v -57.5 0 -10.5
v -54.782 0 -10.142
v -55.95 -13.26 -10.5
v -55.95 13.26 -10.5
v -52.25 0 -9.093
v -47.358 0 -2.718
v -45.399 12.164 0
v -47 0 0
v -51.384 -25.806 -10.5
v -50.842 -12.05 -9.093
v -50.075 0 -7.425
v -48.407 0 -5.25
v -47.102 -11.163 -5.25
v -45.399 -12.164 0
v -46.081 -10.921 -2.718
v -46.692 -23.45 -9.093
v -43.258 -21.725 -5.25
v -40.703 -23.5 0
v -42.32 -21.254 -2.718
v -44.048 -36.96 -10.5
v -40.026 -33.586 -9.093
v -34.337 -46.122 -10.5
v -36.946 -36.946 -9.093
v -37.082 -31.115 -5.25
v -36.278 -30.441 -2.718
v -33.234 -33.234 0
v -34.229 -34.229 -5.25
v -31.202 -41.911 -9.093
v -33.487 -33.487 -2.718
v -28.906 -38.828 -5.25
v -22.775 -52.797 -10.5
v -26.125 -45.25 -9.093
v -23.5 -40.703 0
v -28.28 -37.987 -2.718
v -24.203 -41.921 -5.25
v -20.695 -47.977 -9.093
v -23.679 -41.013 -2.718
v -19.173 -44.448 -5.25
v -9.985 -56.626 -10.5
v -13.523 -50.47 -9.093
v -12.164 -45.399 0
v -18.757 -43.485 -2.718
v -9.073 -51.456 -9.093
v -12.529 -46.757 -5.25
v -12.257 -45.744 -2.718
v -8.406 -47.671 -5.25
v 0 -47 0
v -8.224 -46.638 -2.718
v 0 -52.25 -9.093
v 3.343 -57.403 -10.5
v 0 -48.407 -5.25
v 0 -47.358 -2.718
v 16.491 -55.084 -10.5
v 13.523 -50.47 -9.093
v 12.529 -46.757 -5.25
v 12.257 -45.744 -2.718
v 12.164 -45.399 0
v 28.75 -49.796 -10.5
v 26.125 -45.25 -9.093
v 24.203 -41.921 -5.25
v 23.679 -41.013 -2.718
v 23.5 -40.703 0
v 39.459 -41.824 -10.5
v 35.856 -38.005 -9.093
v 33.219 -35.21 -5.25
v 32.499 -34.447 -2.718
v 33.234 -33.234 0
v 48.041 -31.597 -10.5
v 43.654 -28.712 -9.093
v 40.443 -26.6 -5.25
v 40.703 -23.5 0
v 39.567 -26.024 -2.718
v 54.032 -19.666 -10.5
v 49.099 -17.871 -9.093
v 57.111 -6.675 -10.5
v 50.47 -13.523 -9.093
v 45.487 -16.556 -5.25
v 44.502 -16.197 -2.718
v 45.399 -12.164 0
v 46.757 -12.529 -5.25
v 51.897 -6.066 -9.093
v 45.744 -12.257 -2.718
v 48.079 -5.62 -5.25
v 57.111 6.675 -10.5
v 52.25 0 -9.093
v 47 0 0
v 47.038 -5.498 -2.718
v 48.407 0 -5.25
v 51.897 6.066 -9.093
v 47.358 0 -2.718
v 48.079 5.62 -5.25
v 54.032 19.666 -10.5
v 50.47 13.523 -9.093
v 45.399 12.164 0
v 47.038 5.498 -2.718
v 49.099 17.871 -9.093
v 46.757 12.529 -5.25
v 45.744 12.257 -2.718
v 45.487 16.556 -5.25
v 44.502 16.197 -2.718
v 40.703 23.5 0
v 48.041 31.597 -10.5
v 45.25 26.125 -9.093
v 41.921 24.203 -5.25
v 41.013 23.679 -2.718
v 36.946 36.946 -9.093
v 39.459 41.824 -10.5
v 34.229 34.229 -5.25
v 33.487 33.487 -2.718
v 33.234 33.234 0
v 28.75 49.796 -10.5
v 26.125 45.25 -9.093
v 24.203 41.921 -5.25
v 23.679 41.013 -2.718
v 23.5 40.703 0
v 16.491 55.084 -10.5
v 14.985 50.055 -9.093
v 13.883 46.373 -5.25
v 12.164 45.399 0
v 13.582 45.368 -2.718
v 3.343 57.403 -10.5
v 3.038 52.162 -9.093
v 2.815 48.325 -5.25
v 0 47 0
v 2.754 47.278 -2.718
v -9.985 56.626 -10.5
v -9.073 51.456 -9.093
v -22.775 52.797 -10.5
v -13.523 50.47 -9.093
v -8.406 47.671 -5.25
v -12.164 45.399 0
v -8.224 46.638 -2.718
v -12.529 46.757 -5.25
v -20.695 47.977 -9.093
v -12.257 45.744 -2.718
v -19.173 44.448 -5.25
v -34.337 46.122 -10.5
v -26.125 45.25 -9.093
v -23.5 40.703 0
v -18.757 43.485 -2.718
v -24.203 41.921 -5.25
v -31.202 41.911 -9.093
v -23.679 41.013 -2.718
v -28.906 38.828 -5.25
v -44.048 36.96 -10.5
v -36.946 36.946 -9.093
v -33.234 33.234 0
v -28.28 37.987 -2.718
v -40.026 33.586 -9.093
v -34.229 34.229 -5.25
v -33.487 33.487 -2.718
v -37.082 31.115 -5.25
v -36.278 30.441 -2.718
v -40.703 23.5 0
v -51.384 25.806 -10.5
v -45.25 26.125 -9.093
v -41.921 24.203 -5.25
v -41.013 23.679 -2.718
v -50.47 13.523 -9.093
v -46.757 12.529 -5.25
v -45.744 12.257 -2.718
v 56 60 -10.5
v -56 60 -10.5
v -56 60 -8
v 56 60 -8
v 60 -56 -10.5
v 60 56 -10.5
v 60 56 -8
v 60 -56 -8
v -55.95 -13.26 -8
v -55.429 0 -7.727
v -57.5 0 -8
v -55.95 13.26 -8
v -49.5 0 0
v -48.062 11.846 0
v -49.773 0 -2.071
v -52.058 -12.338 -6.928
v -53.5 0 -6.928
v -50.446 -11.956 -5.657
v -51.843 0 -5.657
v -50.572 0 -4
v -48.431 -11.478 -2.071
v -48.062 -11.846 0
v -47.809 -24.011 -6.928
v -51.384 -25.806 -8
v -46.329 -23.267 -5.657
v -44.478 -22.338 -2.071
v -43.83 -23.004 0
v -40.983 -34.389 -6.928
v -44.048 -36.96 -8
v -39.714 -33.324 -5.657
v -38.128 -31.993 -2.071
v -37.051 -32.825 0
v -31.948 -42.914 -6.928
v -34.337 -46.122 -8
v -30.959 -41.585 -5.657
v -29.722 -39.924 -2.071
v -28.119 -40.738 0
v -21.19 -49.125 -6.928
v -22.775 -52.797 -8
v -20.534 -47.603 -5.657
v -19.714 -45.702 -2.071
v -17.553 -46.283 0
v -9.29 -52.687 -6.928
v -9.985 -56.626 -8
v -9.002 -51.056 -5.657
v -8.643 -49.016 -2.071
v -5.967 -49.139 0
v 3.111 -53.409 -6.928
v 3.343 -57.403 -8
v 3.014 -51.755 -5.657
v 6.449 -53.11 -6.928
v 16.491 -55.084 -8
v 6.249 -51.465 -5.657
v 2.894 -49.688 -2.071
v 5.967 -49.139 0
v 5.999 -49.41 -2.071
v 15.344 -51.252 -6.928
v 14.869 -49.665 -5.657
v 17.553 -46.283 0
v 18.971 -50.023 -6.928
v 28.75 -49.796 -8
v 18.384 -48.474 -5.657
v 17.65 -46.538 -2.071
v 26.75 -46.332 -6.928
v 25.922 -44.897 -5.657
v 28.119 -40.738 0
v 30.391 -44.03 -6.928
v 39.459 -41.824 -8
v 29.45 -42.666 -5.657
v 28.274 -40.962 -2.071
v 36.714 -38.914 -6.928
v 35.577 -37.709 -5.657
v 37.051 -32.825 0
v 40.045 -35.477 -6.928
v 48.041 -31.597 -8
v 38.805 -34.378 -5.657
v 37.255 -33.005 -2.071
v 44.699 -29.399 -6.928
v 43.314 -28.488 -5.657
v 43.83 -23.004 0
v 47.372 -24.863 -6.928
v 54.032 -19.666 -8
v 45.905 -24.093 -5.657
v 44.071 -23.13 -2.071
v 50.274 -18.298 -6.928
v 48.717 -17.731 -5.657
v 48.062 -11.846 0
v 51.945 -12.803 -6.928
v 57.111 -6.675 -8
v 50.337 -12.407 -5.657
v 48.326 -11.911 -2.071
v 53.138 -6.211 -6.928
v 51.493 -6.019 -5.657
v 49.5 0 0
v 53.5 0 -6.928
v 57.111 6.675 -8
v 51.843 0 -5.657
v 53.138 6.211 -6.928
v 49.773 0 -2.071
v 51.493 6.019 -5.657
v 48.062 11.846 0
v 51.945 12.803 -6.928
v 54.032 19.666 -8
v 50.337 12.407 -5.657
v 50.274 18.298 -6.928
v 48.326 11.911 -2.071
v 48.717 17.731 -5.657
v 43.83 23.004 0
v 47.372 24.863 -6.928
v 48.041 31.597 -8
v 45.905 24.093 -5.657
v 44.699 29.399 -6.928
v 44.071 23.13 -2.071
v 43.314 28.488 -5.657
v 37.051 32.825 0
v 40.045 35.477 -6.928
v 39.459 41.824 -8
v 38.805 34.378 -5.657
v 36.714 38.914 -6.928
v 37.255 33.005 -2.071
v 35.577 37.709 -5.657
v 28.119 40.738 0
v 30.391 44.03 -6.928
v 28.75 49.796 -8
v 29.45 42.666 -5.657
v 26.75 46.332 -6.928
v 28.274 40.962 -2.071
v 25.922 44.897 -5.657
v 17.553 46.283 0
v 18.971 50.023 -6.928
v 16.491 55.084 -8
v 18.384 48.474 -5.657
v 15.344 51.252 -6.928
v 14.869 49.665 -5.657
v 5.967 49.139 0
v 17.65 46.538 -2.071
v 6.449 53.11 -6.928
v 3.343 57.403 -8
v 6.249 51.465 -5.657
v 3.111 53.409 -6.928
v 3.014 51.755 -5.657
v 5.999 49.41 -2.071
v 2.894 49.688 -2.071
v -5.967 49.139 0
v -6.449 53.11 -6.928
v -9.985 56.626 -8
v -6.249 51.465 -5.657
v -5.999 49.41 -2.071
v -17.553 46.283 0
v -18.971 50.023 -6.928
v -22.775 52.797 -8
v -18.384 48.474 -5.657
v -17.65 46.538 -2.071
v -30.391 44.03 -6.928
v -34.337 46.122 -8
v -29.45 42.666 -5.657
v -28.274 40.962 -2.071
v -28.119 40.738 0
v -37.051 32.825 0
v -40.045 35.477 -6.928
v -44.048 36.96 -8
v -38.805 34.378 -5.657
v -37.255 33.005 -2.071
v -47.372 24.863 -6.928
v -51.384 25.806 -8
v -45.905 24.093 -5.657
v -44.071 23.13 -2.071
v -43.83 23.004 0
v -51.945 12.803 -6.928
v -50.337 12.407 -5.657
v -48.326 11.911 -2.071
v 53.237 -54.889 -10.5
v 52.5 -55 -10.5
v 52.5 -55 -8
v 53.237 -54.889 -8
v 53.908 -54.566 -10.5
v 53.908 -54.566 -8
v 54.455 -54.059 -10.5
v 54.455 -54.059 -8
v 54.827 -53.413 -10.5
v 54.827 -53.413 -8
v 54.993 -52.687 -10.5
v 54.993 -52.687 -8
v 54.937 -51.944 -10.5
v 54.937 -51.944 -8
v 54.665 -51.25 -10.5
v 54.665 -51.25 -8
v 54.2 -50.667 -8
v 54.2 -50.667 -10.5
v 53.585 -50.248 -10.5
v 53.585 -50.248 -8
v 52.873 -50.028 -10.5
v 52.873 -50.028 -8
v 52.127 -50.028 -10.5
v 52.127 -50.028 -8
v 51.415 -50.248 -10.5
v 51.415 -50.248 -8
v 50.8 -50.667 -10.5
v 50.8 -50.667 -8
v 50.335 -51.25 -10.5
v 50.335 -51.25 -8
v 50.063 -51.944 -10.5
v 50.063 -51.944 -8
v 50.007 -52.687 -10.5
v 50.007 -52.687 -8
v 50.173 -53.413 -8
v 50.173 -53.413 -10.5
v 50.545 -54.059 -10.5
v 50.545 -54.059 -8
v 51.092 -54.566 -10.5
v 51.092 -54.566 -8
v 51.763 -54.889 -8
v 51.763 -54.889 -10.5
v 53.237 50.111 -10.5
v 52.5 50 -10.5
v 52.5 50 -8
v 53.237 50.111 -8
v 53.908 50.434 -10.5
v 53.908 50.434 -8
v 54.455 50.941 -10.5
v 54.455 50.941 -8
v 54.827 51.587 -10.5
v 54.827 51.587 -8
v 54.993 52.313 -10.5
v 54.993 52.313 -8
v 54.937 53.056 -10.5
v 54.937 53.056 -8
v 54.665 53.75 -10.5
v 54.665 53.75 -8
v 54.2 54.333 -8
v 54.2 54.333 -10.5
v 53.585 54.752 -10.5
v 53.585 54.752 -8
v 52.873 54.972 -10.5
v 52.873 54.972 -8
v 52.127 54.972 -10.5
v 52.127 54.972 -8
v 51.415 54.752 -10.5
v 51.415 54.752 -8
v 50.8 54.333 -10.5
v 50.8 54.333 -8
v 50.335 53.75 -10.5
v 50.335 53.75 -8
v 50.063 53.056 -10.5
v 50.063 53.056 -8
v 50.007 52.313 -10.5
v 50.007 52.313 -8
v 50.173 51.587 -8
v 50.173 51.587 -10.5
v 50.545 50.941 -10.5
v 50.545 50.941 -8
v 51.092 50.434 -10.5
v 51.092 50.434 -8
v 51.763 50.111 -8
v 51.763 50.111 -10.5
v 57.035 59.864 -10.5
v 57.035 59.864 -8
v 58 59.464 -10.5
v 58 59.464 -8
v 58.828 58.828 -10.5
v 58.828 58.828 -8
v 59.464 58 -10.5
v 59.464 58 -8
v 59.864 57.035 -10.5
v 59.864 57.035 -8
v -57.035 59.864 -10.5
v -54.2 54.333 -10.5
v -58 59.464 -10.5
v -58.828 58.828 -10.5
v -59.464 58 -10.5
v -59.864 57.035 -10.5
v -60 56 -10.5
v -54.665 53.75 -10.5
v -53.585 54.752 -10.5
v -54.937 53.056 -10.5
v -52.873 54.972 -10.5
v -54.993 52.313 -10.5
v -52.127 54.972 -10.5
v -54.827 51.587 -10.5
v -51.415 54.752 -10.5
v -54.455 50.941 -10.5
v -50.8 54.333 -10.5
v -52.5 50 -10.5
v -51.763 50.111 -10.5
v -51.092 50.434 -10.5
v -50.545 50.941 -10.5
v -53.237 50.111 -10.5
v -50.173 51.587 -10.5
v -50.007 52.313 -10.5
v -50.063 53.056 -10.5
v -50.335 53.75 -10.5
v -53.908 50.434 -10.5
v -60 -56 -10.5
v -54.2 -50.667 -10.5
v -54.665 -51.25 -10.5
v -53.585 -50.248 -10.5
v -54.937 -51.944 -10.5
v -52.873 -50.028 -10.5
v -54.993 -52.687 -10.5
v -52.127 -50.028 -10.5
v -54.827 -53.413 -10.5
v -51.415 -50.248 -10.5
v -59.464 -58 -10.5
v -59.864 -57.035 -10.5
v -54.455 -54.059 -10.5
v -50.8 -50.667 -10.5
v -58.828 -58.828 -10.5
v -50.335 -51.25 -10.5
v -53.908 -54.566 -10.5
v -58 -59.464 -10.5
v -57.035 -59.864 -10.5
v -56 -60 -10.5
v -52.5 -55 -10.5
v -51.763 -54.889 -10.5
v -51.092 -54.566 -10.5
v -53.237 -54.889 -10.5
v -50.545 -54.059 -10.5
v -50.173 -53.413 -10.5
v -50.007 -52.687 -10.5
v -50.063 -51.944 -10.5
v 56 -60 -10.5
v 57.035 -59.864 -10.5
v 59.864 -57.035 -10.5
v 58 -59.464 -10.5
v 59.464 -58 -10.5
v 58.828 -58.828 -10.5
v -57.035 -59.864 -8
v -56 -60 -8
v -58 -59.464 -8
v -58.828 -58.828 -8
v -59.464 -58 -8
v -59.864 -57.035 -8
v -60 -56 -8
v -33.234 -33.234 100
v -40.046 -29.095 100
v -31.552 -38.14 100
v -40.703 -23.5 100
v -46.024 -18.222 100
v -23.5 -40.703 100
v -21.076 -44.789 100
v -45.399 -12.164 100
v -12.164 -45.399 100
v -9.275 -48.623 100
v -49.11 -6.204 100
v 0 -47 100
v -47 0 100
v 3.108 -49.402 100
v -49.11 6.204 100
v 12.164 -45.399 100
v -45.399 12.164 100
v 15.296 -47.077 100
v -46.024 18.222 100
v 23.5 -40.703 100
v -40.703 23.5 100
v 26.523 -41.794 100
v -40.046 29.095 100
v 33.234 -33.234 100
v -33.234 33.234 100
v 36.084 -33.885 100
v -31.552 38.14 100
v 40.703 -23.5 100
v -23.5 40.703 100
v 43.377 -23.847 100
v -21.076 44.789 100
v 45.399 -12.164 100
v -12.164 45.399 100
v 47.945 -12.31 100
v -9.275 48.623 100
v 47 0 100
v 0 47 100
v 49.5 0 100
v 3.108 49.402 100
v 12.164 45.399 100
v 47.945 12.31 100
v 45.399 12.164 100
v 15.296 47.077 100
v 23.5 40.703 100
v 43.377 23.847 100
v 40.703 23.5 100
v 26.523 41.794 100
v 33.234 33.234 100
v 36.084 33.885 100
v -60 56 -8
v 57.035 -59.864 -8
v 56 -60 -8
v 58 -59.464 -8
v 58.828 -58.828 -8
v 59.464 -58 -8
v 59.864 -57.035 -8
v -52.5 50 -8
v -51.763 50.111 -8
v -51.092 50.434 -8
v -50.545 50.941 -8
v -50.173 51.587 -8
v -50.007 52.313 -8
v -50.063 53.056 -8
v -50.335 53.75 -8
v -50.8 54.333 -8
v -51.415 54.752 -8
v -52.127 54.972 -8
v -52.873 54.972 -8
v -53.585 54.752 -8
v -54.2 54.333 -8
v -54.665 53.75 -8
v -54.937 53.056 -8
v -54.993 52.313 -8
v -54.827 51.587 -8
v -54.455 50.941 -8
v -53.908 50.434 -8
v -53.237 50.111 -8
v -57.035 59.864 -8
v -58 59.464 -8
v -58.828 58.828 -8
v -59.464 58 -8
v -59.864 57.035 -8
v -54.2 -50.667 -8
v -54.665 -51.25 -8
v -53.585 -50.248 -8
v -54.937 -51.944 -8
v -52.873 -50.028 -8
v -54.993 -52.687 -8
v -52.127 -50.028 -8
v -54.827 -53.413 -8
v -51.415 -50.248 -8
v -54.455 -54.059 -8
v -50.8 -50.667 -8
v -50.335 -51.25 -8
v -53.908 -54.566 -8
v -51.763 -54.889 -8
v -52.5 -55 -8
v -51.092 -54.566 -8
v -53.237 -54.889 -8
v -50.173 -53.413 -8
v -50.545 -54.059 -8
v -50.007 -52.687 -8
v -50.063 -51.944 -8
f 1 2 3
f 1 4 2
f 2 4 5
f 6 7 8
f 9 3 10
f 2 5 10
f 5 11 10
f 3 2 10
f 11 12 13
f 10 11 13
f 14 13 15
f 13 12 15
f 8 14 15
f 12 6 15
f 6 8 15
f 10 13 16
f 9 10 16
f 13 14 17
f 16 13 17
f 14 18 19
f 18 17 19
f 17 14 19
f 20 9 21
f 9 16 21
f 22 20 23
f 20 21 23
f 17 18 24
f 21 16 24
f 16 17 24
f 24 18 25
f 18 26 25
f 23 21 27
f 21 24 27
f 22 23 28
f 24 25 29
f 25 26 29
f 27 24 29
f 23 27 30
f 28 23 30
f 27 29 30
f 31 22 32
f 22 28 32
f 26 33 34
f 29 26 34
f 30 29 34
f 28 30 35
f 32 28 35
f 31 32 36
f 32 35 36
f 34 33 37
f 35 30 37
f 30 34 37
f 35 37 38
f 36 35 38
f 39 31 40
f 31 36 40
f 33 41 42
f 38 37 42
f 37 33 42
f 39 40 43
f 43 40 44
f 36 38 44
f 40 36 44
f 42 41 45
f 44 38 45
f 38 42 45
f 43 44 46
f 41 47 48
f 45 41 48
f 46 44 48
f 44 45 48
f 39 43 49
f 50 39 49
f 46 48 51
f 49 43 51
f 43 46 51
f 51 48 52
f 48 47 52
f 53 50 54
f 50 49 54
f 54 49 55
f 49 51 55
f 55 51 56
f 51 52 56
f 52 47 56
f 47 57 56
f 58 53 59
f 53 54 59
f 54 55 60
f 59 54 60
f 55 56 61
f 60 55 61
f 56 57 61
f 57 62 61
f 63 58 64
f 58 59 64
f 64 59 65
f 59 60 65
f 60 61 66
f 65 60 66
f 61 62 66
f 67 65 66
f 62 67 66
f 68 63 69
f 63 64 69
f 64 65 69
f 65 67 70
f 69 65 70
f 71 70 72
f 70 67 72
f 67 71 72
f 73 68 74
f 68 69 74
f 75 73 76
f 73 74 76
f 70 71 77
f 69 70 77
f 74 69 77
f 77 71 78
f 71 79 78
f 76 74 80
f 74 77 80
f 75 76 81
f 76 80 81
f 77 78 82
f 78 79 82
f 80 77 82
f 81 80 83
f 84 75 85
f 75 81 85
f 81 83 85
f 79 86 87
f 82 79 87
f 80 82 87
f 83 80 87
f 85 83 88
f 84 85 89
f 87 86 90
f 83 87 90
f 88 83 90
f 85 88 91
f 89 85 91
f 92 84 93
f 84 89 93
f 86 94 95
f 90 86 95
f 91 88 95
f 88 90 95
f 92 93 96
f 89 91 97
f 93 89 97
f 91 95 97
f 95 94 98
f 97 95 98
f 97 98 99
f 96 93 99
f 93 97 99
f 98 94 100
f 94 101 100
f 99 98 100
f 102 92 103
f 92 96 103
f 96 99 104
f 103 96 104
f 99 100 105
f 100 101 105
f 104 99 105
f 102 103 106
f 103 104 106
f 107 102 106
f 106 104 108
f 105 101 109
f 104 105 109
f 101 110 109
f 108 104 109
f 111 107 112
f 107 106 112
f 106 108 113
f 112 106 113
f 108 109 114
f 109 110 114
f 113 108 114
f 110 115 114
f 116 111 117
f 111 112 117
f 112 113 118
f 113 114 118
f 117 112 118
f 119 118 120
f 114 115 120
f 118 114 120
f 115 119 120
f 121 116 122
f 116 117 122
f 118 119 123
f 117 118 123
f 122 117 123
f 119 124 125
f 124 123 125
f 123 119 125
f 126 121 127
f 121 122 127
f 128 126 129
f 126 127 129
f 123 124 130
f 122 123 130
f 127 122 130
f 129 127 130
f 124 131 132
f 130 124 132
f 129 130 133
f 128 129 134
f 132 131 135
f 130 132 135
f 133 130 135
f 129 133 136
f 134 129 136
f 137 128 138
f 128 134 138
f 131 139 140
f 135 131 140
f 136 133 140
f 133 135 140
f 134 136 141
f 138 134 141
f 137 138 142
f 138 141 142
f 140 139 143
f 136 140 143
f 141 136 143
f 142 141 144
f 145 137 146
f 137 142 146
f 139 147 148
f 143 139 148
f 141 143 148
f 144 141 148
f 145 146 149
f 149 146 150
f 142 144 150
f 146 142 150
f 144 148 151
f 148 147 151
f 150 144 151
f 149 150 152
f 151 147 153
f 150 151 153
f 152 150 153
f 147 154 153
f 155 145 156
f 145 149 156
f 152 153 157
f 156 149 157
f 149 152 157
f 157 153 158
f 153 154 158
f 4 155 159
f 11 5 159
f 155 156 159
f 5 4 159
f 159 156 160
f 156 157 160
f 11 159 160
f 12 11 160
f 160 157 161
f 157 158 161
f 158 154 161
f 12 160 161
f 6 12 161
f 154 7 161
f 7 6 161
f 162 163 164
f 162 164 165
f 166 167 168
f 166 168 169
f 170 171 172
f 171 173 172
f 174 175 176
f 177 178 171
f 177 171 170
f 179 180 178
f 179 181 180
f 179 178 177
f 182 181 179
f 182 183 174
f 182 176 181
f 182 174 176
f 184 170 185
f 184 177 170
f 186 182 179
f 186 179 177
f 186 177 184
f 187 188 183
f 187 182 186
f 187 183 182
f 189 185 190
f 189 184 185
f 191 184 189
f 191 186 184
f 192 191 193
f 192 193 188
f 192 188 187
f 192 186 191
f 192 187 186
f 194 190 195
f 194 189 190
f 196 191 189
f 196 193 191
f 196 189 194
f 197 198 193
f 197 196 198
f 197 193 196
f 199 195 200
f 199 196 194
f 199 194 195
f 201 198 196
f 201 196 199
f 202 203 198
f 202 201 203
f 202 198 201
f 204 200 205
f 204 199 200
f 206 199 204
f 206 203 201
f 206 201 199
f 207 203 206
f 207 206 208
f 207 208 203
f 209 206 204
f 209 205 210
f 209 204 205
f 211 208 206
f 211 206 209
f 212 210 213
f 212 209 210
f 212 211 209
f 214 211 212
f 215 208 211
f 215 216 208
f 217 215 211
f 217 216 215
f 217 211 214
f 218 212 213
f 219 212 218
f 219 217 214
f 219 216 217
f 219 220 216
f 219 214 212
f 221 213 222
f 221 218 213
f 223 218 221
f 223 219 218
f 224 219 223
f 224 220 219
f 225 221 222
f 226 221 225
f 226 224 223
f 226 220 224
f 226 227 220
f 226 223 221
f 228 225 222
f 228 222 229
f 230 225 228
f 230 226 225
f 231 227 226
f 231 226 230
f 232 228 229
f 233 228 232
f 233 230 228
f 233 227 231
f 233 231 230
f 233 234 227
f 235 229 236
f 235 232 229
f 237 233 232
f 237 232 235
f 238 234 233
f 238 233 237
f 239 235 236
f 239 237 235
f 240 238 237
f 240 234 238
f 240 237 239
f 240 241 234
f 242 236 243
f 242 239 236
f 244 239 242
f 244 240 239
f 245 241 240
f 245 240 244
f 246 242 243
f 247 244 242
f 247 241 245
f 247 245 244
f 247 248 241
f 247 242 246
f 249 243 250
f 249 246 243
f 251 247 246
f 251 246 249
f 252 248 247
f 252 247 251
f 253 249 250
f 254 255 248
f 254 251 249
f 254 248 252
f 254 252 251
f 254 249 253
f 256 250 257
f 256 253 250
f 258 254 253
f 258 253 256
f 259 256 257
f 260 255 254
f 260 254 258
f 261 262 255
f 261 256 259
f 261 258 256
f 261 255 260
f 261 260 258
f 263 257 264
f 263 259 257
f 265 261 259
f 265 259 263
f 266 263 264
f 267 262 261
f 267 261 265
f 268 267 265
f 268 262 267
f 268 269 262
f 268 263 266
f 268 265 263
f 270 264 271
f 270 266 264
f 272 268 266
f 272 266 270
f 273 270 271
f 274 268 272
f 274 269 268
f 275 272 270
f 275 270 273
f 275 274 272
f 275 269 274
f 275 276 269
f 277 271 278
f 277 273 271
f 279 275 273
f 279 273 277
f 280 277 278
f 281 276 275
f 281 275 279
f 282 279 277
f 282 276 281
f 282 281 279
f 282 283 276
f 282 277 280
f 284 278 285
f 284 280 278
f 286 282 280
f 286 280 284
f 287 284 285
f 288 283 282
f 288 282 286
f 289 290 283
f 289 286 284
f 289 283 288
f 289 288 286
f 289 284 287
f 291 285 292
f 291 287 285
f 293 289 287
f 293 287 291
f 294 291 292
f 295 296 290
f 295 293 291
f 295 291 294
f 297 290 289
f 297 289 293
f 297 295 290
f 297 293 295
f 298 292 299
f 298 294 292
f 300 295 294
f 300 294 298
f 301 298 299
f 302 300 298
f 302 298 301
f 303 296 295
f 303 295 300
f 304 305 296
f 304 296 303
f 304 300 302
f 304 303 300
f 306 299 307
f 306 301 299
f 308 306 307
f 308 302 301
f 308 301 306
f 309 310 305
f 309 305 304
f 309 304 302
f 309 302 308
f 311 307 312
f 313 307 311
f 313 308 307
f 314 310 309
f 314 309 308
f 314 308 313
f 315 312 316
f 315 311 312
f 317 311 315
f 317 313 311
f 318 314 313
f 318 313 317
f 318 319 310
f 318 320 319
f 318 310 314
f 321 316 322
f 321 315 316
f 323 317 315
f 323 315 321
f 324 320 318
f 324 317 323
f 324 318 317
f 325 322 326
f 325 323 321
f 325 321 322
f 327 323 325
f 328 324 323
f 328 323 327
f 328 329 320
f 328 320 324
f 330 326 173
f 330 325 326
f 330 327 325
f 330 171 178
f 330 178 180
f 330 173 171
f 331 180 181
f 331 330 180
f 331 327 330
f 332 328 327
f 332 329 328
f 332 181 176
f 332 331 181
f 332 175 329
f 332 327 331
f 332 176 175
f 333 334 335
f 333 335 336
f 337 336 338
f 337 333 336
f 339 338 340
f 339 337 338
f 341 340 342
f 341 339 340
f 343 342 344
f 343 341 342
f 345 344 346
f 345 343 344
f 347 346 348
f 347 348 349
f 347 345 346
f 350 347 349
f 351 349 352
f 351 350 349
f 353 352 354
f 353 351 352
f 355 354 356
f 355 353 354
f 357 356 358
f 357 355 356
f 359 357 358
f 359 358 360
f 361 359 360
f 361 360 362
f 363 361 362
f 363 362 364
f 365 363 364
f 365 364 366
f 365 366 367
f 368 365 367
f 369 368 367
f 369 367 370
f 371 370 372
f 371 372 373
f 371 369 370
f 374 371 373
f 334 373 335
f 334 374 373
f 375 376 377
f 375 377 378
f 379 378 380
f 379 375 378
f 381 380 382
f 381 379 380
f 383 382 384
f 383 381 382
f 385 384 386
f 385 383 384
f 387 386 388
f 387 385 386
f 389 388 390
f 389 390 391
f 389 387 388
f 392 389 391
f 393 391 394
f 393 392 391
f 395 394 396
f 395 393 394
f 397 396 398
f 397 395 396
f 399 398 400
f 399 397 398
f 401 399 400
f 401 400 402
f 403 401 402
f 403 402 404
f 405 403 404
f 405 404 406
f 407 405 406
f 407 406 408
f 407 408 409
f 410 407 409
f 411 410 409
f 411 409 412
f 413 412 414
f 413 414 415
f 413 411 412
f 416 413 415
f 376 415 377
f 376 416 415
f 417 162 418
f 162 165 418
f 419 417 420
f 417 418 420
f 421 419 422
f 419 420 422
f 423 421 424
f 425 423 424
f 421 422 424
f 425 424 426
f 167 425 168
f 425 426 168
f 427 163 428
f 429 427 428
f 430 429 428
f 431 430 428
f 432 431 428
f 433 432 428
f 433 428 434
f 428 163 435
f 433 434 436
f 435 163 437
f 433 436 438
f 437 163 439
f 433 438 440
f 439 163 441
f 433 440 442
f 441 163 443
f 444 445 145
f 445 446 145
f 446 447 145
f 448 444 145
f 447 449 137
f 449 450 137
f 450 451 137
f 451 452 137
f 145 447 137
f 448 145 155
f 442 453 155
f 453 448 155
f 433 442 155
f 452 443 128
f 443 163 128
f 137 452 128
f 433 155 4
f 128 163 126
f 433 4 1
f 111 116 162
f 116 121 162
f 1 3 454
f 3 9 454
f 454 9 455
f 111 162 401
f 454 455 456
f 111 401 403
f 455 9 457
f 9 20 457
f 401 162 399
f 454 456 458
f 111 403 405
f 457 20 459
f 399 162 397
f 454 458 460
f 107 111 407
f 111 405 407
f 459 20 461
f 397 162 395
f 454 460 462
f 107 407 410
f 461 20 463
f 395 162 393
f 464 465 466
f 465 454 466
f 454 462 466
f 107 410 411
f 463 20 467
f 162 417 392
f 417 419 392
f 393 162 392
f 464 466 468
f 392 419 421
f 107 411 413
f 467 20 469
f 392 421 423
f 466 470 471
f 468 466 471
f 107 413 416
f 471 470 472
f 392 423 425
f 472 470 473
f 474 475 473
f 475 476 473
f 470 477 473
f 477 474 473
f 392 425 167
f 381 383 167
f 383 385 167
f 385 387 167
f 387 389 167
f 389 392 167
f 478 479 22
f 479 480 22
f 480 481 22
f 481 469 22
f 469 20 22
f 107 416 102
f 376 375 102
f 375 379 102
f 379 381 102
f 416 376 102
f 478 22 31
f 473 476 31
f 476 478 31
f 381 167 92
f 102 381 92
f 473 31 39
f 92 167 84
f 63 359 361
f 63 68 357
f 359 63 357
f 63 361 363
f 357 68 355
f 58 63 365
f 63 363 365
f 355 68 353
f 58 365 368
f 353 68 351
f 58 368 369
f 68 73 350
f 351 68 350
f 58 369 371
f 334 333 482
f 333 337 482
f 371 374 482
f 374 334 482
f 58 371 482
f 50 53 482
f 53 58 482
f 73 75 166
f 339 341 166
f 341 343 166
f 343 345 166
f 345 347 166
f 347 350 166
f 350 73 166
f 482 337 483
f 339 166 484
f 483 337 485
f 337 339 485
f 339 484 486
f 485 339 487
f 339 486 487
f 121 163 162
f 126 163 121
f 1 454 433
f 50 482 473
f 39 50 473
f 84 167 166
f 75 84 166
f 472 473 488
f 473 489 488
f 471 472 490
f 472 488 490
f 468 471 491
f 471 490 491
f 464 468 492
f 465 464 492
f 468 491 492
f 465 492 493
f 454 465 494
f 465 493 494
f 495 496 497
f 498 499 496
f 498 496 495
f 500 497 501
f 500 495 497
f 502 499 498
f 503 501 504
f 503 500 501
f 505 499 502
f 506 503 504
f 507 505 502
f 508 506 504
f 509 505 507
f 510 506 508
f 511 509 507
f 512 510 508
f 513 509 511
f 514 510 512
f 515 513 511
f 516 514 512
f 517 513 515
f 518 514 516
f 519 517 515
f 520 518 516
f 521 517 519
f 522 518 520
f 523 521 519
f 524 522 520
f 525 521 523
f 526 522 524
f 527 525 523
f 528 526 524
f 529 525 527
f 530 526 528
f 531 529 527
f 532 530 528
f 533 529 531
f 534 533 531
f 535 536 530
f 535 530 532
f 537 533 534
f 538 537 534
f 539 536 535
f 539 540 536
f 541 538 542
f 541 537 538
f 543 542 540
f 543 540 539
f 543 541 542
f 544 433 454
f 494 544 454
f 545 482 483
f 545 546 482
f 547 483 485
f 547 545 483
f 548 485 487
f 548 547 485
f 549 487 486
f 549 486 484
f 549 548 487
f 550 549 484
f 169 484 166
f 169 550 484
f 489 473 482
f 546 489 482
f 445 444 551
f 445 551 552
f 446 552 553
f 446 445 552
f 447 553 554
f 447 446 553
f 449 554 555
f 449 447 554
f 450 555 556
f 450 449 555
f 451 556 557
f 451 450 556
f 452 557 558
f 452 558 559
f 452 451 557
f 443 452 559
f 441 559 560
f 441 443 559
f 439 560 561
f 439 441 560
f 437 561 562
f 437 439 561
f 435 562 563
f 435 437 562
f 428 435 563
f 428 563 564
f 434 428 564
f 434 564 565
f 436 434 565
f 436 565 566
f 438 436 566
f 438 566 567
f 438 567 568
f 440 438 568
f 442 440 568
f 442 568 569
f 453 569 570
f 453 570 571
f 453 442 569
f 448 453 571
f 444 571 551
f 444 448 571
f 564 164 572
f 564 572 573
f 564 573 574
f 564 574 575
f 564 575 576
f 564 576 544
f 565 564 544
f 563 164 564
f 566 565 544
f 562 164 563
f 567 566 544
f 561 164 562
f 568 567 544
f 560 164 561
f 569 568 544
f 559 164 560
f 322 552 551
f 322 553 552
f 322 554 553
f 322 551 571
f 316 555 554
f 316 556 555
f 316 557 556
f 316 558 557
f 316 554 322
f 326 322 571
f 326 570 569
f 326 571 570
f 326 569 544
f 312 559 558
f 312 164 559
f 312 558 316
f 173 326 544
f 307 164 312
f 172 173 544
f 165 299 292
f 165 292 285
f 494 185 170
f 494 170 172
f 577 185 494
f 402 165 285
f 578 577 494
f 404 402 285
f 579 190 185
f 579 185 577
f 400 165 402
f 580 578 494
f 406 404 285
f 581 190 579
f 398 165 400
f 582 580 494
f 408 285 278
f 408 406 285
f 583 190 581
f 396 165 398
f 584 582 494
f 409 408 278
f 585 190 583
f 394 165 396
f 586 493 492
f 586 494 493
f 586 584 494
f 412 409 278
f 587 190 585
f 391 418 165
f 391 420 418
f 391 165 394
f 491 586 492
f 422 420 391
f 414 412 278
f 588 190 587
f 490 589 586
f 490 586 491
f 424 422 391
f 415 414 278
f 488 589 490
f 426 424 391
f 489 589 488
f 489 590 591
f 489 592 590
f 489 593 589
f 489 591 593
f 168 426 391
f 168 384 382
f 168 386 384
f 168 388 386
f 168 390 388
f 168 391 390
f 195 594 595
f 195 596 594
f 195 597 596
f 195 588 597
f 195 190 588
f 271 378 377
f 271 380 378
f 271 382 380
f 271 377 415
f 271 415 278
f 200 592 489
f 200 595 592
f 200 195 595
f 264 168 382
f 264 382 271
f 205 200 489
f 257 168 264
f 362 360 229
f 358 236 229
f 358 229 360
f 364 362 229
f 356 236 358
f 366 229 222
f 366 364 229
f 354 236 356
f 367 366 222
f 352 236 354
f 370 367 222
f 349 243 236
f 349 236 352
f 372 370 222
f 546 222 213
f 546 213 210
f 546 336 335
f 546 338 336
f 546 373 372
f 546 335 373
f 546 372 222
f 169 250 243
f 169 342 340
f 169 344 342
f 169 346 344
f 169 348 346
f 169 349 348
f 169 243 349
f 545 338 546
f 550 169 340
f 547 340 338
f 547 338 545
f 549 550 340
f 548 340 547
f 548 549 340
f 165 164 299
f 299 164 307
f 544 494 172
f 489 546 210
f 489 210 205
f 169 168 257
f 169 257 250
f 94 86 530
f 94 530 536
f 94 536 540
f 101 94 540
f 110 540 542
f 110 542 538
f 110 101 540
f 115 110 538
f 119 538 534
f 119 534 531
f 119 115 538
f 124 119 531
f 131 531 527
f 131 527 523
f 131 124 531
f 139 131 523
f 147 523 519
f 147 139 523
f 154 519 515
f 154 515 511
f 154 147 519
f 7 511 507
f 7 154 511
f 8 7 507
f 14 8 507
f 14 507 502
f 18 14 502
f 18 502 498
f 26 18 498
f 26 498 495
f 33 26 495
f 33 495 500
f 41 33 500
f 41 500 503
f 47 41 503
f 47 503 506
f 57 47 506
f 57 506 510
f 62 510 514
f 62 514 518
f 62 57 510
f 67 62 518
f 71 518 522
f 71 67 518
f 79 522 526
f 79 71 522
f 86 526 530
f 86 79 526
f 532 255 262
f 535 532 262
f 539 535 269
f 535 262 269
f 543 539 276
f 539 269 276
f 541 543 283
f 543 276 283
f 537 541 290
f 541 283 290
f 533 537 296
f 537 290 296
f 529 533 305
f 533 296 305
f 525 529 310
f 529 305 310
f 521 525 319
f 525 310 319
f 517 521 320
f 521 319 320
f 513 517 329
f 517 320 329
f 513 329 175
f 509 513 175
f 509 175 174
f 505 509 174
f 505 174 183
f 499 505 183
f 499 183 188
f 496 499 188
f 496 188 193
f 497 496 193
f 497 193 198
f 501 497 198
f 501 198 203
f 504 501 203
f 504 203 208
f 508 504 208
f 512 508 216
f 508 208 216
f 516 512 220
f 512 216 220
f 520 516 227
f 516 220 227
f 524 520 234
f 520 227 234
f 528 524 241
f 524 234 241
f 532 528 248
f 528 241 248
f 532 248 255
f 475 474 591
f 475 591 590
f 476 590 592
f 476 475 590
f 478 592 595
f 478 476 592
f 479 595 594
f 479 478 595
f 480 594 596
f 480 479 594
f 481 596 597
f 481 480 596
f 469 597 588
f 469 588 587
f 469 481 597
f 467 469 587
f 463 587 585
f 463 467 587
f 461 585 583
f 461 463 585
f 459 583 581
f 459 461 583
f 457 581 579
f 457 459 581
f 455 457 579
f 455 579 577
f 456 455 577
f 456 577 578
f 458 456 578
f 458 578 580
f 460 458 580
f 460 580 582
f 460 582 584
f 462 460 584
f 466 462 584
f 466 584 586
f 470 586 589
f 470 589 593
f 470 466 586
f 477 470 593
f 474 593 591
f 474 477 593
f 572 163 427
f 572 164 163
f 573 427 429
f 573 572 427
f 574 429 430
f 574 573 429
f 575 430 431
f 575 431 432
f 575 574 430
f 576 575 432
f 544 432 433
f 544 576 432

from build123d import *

# Parameters (mm, degrees)
SKETCH_R      = 49.5
SKETCH_R_2    = 47
PAD_DEPTH     = 100
SKETCH002_W   = 120
SKETCH002_H   = 120
SKETCH002_R   = 57.5
SKETCH002_R_2 = 2.5
PAD001_DEPTH  = 2.5
FILLET_R      = 4


with BuildPart() as part:
    # Sketch → Pad (new body)
    with BuildSketch(Plane.XY):
        Circle(SKETCH_R)
        Circle(SKETCH_R_2, mode=Mode.SUBTRACT)
    extrude(amount=PAD_DEPTH)

    # Sketch001 → Revolution (revolve)
    with BuildSketch(Plane.XZ):
        with BuildLine():
            ThreePointArc((-57.5, -10.5), (-50.075379, -7.424621), (-47, 0))
            Line((-49.5, 0), (-47, 0))
            ThreePointArc((-57.5, -8), (-51.843146, -5.656854), (-49.5, 0))
            Line((-57.5, -10.5), (-57.5, -8))
        make_face()
    revolve(axis=Axis((0, 0, 0), (0, 0, 1)))

    # Sketch002 (on DatumPlane) → Pad001 (join)
    with BuildSketch(Plane(origin=(0, 0, -10.5), x_dir=(0, -1, 0), z_dir=(0, 0, 1))):
        Rectangle(SKETCH002_W, SKETCH002_H)
        Circle(SKETCH002_R, mode=Mode.SUBTRACT)
        with Locations((-52.499987, 52.500013)):
            Circle(SKETCH002_R_2, mode=Mode.SUBTRACT)
        with Locations((-52.500013, -52.499987)):
            Circle(SKETCH002_R_2, mode=Mode.SUBTRACT)
        with Locations((52.499987, -52.500013)):
            Circle(SKETCH002_R_2, mode=Mode.SUBTRACT)
        with Locations((52.500013, 52.499987)):
            Circle(SKETCH002_R_2, mode=Mode.SUBTRACT)
    extrude(amount=PAD001_DEPTH)

    # Fillet
    fillet_edges = [part.edges().sort_by_distance(p)[0] for p in [
        (-60, -60, -9.25),
        (60, -60, -9.25),
        (-60, 60, -9.25),
        (60, 60, -9.25),
    ]]
    fillet(fillet_edges, radius=FILLET_R)


solid = part.part
